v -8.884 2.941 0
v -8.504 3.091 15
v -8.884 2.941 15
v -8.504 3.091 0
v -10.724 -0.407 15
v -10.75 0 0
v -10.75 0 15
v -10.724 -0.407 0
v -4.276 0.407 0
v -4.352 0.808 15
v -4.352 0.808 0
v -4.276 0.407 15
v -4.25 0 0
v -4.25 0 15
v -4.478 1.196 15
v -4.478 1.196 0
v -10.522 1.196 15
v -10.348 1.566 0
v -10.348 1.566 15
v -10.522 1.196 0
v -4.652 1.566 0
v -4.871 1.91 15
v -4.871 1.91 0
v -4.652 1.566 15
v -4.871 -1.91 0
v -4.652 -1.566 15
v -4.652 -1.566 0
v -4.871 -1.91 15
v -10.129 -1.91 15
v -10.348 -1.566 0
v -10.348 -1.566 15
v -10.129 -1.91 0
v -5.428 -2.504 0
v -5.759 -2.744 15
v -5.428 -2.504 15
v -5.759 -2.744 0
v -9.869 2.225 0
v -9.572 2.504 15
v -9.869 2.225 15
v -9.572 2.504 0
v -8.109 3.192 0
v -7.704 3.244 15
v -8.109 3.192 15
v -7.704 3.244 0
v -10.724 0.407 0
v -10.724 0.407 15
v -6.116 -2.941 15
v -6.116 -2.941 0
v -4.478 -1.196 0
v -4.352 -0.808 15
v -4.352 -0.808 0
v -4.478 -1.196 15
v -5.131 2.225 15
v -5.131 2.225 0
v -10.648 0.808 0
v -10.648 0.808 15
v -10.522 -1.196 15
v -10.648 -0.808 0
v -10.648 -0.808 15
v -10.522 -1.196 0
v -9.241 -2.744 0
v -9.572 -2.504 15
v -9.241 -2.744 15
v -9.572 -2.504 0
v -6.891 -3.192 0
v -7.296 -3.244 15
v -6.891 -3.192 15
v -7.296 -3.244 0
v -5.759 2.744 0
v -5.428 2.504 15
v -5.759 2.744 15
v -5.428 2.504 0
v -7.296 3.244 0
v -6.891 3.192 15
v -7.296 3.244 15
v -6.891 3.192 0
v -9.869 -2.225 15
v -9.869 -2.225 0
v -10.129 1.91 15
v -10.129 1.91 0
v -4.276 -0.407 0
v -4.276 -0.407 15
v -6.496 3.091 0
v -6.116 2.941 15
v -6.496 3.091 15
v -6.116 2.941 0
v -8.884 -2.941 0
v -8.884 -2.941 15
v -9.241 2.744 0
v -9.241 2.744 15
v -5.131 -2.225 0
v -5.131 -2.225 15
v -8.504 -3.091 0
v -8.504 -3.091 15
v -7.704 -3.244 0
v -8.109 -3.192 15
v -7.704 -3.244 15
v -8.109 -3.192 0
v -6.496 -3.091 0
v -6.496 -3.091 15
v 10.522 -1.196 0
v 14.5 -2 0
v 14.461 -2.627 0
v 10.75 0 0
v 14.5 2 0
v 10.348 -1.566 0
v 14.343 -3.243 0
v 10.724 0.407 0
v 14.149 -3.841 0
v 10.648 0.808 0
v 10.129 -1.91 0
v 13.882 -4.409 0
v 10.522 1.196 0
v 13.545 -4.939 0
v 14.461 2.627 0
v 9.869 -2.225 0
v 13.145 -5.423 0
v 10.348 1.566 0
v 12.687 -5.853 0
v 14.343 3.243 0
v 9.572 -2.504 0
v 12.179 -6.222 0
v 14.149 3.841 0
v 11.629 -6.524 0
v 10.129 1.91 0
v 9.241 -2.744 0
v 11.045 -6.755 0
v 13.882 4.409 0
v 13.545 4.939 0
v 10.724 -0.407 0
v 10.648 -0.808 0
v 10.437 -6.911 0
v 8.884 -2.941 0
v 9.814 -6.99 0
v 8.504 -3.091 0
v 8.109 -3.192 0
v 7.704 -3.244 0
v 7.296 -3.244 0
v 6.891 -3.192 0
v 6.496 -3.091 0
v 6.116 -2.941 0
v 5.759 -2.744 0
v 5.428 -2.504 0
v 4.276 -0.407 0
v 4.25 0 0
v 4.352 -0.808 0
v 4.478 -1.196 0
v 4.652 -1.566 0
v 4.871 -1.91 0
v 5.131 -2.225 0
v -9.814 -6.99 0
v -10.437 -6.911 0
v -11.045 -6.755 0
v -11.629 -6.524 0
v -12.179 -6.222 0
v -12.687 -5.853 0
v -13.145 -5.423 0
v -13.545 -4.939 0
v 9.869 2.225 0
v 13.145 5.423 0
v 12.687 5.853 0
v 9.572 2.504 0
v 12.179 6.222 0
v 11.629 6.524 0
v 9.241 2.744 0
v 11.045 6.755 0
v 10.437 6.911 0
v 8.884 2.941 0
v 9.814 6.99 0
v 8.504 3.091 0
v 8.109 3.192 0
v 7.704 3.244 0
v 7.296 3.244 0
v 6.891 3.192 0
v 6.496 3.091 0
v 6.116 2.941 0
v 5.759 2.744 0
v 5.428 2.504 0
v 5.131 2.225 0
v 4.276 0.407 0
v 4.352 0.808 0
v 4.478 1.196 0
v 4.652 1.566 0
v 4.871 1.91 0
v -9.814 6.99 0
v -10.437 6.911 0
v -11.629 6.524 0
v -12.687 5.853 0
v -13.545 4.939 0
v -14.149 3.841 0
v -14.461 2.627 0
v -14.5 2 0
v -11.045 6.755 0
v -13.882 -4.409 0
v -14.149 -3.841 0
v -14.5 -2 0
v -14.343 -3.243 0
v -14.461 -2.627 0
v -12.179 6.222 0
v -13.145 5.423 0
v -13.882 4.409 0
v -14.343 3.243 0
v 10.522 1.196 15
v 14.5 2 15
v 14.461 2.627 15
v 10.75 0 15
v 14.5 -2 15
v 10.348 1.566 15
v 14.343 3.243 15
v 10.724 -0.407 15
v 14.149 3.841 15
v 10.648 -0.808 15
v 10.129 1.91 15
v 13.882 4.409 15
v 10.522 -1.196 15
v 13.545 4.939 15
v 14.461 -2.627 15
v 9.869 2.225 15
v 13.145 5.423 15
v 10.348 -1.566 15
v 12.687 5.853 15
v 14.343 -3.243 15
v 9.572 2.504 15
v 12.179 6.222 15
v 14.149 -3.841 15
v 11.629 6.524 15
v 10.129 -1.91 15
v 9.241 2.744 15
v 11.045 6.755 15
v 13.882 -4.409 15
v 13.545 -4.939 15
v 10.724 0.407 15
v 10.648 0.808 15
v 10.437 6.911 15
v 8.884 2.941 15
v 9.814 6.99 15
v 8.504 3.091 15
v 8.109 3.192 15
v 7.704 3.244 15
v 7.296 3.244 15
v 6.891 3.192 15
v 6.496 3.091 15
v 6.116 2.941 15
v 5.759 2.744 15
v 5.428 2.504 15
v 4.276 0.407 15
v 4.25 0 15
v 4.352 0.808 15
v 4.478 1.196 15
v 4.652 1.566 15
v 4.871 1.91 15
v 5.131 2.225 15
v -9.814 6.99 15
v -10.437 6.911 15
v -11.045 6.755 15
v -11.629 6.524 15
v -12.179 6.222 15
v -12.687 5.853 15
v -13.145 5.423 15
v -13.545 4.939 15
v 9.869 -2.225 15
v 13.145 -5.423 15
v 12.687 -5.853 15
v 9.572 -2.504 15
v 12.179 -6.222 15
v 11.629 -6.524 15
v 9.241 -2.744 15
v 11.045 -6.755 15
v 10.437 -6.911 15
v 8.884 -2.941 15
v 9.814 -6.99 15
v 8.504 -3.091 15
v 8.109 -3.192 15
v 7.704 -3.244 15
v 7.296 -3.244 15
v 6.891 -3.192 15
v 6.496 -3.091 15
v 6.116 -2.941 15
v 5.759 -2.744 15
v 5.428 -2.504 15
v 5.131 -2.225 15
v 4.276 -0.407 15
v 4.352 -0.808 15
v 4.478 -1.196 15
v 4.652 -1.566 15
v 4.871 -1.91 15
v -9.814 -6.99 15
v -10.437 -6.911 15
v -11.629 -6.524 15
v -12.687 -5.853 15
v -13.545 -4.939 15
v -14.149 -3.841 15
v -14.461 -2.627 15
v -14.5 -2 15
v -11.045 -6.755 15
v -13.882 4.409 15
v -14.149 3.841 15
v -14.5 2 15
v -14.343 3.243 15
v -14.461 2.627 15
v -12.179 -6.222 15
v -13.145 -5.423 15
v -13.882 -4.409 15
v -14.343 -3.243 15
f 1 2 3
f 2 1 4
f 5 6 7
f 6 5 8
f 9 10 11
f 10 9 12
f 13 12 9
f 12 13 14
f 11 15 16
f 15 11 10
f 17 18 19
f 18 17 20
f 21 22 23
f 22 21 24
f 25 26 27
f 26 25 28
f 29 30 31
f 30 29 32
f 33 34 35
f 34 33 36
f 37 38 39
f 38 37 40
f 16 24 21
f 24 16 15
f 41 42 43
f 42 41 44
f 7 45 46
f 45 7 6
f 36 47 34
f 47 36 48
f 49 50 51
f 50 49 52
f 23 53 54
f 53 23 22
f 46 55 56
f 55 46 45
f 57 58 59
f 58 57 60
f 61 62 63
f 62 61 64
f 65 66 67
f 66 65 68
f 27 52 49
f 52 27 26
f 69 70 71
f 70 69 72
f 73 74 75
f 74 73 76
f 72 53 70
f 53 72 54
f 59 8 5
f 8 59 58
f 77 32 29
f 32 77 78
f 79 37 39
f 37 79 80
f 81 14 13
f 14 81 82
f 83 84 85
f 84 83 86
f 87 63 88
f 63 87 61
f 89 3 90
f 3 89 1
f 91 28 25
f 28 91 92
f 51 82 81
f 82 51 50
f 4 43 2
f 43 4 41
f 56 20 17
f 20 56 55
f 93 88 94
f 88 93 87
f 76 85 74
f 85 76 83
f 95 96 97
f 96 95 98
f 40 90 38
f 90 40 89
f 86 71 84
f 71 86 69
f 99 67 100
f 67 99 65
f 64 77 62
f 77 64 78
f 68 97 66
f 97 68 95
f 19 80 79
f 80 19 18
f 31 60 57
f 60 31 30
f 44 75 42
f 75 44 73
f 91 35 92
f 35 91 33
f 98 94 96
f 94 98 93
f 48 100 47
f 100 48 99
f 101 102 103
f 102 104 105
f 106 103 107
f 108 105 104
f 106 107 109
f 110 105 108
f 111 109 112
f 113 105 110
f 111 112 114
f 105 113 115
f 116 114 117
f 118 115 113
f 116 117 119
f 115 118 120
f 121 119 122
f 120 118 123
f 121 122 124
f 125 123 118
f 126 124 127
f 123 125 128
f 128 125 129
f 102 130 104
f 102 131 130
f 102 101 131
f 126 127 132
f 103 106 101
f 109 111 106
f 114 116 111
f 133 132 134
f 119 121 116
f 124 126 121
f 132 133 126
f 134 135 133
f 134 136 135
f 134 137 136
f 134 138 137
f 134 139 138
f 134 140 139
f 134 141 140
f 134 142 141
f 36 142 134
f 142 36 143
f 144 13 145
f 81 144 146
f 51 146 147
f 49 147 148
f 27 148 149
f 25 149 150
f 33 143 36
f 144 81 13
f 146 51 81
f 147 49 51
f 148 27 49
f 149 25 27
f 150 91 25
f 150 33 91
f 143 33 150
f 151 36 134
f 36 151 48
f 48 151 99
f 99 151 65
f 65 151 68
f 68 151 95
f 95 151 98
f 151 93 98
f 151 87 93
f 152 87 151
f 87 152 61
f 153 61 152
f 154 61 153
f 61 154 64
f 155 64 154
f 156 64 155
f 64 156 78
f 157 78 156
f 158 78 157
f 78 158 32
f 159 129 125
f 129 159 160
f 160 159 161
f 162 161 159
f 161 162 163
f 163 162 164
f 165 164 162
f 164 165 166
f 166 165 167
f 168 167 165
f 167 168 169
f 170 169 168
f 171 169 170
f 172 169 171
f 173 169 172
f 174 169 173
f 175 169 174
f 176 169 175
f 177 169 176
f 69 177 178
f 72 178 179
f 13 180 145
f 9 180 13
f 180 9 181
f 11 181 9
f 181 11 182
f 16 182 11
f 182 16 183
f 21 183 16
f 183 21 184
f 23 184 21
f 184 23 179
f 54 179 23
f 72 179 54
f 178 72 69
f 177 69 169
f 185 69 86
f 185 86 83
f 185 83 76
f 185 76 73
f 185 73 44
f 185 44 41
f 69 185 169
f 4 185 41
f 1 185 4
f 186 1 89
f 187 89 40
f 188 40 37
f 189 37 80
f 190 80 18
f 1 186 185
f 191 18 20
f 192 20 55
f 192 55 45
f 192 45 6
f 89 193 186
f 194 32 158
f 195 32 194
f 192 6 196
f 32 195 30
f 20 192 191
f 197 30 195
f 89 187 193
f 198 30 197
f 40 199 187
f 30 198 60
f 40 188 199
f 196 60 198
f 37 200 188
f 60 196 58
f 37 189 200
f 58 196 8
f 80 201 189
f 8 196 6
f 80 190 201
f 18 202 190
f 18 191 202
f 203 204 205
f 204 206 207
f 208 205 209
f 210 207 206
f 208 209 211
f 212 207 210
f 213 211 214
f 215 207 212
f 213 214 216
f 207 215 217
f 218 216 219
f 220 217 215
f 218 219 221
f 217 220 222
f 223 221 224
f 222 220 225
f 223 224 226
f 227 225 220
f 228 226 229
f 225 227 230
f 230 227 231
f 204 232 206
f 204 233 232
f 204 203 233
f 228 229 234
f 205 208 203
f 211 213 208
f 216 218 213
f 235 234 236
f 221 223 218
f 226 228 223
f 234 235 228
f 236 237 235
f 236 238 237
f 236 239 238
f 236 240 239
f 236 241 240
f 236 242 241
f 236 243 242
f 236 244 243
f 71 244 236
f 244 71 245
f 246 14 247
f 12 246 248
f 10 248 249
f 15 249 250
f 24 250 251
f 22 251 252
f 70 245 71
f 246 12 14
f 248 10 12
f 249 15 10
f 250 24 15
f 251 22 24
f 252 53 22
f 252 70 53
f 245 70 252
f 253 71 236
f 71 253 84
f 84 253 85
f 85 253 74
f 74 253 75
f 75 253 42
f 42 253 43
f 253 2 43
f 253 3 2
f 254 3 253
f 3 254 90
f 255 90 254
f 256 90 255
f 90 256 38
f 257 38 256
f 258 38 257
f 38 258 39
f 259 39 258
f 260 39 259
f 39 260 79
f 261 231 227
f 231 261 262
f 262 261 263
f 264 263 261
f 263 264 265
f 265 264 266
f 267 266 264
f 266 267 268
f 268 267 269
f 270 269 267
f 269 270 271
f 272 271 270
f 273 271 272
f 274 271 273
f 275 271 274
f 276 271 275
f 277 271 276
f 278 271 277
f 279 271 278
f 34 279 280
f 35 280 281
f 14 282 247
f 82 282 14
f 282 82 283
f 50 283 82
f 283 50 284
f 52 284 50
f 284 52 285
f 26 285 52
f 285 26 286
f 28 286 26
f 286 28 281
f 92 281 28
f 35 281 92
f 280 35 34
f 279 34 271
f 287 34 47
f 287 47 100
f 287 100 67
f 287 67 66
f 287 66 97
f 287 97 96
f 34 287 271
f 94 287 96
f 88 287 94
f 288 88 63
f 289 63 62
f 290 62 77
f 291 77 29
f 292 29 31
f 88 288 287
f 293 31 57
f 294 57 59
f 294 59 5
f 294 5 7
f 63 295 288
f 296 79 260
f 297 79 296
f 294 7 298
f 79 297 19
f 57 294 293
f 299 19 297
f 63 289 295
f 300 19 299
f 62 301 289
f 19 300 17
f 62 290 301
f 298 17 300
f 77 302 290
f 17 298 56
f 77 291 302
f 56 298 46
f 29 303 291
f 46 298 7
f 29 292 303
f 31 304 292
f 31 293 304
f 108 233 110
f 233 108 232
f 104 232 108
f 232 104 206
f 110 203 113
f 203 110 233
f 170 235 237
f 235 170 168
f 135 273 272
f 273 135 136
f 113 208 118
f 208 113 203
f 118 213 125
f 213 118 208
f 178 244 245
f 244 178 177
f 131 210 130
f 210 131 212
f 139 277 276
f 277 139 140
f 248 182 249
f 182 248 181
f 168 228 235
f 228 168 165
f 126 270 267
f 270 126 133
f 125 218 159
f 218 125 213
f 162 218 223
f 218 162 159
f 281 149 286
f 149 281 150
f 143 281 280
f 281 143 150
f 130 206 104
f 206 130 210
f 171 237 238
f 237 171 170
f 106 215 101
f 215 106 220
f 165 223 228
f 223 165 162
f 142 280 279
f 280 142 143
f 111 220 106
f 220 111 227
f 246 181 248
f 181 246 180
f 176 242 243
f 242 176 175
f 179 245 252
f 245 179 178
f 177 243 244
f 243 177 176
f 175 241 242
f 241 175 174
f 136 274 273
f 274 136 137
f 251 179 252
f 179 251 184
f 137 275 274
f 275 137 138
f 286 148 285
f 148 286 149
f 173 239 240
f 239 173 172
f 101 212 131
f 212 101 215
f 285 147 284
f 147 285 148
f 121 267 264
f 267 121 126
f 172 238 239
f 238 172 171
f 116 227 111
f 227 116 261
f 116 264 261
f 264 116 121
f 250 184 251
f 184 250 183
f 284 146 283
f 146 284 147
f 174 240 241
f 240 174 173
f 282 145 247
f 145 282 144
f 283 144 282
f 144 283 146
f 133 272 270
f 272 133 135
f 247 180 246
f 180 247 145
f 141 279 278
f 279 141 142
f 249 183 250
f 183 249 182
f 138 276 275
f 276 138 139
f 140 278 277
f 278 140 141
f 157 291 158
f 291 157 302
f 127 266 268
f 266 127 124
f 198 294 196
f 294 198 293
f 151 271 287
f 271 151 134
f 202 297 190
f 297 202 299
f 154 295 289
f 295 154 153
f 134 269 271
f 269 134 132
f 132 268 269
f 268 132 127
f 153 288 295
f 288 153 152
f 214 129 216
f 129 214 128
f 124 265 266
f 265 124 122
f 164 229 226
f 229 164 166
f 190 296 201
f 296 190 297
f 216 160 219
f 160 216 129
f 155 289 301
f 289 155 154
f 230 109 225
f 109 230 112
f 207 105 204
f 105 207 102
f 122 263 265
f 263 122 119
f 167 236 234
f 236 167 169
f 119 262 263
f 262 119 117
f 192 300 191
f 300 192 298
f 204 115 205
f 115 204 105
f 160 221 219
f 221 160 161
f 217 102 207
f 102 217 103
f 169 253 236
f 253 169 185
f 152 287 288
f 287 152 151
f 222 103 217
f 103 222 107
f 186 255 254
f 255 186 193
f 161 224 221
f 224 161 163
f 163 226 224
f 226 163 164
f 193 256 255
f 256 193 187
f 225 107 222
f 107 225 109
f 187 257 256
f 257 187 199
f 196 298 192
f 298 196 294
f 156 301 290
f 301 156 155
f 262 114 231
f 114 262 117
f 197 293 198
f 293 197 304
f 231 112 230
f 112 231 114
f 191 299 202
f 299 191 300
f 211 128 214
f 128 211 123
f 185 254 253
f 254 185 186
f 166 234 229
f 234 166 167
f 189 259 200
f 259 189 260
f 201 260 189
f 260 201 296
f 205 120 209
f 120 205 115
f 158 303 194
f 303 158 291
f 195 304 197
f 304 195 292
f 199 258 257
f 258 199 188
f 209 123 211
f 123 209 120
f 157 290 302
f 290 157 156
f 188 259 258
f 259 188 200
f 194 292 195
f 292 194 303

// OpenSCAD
$fn = 50;


difference() {
	union() {
		hull() {
			translate(v = [-9.5000000000, 2.0000000000, 0]) {
				cylinder(h = 15, r = 5);
			}
			translate(v = [9.5000000000, 2.0000000000, 0]) {
				cylinder(h = 15, r = 5);
			}
			translate(v = [-9.5000000000, -2.0000000000, 0]) {
				cylinder(h = 15, r = 5);
			}
			translate(v = [9.5000000000, -2.0000000000, 0]) {
				cylinder(h = 15, r = 5);
			}
		}
	}
	union() {
		translate(v = [-7.5000000000, 0.0000000000, 0]) {
			cylinder(h = 15, r = 3.2500000000);
		}
		translate(v = [7.5000000000, 0.0000000000, 0]) {
			cylinder(h = 15, r = 3.2500000000);
		}
		translate(v = [-7.5000000000, 0.0000000000, 0]) {
			cylinder(h = 15, r = 1.8000000000);
		}
		translate(v = [7.5000000000, 0.0000000000, 0]) {
			cylinder(h = 15, r = 1.8000000000);
		}
		translate(v = [-7.5000000000, 0.0000000000, 0]) {
			cylinder(h = 15, r = 1.8000000000);
		}
		translate(v = [7.5000000000, 0.0000000000, 0]) {
			cylinder(h = 15, r = 1.8000000000);
		}
		translate(v = [-7.5000000000, 0.0000000000, 0]) {
			cylinder(h = 15, r = 1.8000000000);
		}
		translate(v = [7.5000000000, 0.0000000000, 0]) {
			cylinder(h = 15, r = 1.8000000000);
		}
	}
}
